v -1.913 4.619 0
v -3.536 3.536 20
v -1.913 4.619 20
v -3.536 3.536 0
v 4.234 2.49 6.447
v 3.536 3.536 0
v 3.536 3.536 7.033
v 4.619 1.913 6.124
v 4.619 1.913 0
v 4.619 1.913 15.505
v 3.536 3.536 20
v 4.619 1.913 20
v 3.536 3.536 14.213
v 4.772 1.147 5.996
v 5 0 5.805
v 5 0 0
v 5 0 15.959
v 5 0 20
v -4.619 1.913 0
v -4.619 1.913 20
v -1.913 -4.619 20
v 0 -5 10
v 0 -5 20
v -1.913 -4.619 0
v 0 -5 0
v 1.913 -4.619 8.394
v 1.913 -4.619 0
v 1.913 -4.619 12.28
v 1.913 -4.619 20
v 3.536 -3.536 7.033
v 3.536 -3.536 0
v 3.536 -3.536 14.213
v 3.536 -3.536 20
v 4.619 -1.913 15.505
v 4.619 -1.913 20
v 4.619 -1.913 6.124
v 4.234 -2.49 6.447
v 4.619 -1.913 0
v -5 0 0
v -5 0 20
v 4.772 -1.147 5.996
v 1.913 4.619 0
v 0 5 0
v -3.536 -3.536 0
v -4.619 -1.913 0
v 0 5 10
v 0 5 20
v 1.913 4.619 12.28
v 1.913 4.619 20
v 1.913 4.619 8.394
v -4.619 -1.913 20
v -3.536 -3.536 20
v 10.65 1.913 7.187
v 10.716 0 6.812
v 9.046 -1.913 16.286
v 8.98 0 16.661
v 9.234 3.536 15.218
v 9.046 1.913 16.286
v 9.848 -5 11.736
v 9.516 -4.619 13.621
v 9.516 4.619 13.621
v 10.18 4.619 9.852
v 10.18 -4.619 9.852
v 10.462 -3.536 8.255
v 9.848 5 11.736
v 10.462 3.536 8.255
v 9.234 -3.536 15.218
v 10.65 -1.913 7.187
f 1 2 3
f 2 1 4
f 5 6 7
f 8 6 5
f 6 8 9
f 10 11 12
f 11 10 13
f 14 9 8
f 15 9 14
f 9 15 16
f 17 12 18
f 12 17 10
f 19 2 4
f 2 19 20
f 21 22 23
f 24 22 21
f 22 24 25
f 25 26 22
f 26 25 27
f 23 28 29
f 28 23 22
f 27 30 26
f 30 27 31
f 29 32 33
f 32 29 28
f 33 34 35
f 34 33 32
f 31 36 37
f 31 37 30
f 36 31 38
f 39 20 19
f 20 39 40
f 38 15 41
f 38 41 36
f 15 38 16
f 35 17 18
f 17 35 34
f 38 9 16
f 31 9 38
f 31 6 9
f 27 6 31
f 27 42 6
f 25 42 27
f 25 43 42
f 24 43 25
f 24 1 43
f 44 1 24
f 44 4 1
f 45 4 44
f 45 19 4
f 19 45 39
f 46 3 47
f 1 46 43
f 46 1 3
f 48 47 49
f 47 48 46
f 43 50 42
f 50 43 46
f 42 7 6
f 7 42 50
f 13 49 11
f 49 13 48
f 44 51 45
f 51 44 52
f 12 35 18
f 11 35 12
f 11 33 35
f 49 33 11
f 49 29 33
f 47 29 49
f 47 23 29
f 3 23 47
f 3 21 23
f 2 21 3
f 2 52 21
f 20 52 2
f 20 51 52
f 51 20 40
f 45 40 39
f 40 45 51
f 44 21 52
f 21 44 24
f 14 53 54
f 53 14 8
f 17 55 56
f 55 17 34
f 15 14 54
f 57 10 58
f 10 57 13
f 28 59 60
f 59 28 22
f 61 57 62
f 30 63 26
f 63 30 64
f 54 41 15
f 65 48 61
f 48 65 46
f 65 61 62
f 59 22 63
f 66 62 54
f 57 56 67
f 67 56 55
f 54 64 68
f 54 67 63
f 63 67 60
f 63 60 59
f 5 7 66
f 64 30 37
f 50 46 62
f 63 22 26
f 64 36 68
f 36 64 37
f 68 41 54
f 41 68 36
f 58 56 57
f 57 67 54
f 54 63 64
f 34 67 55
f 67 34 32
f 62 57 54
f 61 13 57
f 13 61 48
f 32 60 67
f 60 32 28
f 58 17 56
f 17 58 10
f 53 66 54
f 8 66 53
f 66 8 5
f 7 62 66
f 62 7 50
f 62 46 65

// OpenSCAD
// The same tee off the axis. An oblique arrival is where the size gate's misses
// and the curved-arrival fallback both live.
FNSET = 0; $fn = FNSET;
R = 1;
union() {
    cylinder(d = 10, h = 20);
    translate([0, 0, 10]) rotate([0, 80, 0]) cylinder(d = 10, h = 10);
}
